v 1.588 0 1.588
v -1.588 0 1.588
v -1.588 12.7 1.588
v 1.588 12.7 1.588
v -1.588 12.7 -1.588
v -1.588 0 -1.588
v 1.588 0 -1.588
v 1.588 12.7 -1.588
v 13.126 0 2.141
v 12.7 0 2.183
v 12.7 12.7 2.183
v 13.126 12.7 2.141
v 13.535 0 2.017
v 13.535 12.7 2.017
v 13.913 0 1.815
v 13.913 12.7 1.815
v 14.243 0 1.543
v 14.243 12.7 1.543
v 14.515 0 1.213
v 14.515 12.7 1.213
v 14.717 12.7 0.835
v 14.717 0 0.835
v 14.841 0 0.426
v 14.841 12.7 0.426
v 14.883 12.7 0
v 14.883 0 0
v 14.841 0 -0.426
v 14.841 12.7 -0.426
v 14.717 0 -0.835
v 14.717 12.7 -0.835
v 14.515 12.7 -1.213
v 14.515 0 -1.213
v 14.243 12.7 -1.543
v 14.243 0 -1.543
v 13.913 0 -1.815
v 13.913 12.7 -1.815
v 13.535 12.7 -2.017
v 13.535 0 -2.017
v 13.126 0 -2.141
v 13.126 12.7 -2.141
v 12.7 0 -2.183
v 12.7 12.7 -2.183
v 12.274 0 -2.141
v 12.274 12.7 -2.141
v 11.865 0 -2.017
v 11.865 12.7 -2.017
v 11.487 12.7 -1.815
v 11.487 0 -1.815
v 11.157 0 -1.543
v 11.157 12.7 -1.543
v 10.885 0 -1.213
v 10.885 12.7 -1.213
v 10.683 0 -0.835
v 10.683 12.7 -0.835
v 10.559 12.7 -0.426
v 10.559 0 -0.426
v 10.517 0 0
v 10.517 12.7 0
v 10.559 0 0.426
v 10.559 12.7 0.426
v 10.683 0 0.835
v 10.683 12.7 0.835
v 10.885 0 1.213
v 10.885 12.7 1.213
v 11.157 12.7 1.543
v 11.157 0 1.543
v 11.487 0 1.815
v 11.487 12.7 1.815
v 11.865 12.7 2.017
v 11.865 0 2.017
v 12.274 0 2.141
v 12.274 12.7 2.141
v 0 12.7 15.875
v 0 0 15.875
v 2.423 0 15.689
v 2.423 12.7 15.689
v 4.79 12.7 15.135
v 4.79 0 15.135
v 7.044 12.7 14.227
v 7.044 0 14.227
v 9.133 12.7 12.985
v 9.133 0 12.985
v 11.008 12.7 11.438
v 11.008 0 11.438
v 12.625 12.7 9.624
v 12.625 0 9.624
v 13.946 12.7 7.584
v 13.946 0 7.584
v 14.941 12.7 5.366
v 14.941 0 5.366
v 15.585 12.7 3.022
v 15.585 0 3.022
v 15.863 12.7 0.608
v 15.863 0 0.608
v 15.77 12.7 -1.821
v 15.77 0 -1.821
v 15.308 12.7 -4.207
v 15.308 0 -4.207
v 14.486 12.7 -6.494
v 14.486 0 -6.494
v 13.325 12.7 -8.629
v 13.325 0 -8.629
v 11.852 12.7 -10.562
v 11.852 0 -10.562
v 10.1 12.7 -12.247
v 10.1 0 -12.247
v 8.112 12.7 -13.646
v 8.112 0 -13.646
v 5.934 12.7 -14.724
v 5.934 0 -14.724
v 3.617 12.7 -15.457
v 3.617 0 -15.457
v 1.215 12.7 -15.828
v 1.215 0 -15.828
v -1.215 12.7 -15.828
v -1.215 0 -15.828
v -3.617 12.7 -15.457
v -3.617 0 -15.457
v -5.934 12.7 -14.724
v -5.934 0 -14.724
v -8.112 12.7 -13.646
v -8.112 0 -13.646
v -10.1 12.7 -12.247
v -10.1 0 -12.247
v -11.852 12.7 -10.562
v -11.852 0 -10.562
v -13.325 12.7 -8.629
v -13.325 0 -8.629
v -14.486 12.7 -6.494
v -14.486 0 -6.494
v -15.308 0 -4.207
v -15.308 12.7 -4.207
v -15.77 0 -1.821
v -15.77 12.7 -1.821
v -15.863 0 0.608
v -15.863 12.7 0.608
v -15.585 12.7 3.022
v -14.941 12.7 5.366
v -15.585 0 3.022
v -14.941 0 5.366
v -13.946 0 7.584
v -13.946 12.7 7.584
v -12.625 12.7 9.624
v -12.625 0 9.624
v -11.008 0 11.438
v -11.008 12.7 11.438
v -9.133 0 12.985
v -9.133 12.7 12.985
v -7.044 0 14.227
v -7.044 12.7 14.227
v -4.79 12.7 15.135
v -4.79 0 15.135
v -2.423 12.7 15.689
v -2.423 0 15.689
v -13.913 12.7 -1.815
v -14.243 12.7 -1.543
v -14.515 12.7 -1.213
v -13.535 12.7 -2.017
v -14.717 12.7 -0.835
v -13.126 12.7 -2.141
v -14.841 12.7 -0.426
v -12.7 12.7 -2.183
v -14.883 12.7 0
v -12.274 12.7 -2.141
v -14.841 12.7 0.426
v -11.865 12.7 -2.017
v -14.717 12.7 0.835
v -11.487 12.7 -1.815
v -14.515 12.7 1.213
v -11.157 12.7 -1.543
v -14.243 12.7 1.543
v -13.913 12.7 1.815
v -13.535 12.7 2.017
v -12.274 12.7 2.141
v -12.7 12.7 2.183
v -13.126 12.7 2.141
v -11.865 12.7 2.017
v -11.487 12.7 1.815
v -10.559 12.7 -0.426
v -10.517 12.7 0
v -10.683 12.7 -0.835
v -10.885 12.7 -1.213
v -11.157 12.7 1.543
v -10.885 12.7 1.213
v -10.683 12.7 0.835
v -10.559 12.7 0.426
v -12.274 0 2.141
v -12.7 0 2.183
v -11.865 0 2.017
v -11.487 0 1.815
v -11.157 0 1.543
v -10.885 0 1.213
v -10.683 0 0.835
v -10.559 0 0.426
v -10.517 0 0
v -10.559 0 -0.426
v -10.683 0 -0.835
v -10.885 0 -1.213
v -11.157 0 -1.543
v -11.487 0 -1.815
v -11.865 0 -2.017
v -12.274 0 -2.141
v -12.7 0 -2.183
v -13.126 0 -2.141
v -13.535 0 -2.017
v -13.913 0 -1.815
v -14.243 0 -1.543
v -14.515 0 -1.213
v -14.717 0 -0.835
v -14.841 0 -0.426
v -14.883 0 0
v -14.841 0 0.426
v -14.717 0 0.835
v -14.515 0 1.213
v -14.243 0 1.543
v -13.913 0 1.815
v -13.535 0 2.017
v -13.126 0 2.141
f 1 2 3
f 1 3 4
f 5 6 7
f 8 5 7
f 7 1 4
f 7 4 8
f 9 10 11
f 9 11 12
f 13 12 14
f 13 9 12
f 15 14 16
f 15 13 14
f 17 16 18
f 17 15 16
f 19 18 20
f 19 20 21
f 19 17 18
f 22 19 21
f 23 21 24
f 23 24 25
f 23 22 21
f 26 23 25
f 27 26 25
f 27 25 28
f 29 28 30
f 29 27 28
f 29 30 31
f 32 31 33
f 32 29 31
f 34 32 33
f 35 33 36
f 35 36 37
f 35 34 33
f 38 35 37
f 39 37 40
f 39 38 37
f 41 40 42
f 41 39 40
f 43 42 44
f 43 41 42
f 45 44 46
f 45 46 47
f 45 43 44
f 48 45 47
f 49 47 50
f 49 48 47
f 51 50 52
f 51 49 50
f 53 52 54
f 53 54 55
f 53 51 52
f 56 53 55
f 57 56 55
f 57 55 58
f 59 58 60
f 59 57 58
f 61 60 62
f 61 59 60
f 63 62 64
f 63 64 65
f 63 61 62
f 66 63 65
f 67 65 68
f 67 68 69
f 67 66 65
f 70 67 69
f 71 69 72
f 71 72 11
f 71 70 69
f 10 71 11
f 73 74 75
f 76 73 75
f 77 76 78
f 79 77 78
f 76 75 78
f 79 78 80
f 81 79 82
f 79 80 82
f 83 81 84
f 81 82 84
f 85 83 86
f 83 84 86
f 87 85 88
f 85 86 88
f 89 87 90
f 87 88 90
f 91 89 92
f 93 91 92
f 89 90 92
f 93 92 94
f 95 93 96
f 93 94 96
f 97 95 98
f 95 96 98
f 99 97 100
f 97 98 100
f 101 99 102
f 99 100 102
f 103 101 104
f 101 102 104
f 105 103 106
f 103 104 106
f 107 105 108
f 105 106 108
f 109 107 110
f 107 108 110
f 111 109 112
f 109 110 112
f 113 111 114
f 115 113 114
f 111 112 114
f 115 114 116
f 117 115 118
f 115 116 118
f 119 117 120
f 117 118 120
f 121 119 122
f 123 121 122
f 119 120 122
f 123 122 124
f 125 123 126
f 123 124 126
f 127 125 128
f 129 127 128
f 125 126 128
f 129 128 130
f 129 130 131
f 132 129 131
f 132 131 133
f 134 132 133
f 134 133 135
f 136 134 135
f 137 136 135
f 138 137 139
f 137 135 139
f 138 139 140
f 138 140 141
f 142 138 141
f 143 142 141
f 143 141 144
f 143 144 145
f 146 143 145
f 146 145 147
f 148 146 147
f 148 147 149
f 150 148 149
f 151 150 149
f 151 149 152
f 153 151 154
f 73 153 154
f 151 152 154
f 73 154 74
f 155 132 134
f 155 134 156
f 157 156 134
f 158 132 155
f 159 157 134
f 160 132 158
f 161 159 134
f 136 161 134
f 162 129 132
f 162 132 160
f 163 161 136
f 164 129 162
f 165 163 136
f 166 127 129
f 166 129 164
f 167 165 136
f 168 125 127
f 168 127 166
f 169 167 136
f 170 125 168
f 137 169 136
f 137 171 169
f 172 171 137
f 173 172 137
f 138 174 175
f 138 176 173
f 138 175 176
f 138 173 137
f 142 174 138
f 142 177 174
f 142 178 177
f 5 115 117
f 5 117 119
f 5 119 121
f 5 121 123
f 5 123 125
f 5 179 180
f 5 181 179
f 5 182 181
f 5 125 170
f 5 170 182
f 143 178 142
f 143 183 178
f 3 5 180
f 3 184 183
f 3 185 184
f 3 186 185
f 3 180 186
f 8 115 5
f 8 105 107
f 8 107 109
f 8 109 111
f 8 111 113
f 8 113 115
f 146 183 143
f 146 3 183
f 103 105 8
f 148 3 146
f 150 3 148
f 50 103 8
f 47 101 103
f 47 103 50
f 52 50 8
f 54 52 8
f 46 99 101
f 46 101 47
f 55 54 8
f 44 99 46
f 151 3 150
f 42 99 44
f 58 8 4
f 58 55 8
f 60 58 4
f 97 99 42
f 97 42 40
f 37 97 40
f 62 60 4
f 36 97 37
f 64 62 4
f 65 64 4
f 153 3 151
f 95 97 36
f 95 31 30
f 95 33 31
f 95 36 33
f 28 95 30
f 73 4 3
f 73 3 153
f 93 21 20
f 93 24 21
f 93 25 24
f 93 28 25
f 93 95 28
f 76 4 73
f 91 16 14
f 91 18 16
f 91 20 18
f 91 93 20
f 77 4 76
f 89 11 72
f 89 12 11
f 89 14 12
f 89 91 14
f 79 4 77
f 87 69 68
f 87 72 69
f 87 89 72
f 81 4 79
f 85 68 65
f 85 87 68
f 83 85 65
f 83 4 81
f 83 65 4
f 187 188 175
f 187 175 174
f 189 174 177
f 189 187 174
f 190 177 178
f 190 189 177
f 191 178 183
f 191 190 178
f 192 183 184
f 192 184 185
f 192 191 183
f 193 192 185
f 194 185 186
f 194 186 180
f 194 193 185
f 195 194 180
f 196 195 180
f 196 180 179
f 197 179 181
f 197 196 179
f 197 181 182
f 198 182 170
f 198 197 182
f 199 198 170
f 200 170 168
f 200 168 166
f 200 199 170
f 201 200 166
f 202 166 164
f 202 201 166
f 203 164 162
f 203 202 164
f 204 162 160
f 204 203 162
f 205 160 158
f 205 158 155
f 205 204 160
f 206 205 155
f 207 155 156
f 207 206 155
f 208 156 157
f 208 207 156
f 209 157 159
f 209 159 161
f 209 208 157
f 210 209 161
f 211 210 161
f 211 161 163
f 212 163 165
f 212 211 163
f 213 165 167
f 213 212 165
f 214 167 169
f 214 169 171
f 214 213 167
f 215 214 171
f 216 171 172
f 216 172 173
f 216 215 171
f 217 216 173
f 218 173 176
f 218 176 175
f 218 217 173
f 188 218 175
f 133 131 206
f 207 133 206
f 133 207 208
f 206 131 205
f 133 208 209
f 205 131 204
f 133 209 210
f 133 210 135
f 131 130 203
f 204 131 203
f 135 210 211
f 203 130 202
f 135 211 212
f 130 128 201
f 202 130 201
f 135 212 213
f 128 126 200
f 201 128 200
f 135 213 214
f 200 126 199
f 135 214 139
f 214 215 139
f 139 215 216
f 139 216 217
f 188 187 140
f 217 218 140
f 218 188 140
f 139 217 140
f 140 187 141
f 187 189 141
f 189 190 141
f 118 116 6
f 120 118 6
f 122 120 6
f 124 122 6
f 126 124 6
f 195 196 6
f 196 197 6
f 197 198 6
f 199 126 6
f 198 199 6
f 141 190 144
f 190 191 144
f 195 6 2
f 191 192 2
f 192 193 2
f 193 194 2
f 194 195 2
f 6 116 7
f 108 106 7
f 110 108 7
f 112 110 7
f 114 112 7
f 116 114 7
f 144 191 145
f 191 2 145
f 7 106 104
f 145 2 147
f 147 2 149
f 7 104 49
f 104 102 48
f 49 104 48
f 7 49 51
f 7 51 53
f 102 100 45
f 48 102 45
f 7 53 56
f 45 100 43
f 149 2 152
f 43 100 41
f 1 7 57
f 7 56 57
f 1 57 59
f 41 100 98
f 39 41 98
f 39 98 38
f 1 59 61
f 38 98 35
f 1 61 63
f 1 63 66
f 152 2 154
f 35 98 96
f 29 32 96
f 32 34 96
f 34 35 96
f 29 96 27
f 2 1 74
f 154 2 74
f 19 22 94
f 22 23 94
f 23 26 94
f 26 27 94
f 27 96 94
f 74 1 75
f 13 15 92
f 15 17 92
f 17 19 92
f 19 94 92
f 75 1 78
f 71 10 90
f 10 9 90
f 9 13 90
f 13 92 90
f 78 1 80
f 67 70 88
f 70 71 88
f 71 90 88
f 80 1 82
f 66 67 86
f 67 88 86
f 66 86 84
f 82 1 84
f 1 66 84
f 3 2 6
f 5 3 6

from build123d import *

# Parameters (mm, degrees)
SKETCH1_R           = 15.875
SKETCH1_R_2         = 2.1828125
SKETCH1_W           = 3.175
SKETCH1_H           = 3.175
BOSS_EXTRUDE1_DEPTH = 12.7


with BuildPart() as part:
    # Sketch1 → Boss-Extrude1 (new body)
    with BuildSketch(Plane(origin=(0, 0, 0), x_dir=(1, 0, 0), z_dir=(0, 1, 0))):
        with Locations(Location((0, 0, 0), (0, 0, 270))):
            Circle(SKETCH1_R)
        with Locations(Location((12.7, 0, 0), (0, 0, 270))):
            Circle(SKETCH1_R_2, mode=Mode.SUBTRACT)
        with Locations(Location((-12.7, 0, 0), (0, 0, 270))):
            Circle(SKETCH1_R_2, mode=Mode.SUBTRACT)
        Rectangle(SKETCH1_W, SKETCH1_H, mode=Mode.SUBTRACT)
    extrude(amount=BOSS_EXTRUDE1_DEPTH)


solid = part.part
